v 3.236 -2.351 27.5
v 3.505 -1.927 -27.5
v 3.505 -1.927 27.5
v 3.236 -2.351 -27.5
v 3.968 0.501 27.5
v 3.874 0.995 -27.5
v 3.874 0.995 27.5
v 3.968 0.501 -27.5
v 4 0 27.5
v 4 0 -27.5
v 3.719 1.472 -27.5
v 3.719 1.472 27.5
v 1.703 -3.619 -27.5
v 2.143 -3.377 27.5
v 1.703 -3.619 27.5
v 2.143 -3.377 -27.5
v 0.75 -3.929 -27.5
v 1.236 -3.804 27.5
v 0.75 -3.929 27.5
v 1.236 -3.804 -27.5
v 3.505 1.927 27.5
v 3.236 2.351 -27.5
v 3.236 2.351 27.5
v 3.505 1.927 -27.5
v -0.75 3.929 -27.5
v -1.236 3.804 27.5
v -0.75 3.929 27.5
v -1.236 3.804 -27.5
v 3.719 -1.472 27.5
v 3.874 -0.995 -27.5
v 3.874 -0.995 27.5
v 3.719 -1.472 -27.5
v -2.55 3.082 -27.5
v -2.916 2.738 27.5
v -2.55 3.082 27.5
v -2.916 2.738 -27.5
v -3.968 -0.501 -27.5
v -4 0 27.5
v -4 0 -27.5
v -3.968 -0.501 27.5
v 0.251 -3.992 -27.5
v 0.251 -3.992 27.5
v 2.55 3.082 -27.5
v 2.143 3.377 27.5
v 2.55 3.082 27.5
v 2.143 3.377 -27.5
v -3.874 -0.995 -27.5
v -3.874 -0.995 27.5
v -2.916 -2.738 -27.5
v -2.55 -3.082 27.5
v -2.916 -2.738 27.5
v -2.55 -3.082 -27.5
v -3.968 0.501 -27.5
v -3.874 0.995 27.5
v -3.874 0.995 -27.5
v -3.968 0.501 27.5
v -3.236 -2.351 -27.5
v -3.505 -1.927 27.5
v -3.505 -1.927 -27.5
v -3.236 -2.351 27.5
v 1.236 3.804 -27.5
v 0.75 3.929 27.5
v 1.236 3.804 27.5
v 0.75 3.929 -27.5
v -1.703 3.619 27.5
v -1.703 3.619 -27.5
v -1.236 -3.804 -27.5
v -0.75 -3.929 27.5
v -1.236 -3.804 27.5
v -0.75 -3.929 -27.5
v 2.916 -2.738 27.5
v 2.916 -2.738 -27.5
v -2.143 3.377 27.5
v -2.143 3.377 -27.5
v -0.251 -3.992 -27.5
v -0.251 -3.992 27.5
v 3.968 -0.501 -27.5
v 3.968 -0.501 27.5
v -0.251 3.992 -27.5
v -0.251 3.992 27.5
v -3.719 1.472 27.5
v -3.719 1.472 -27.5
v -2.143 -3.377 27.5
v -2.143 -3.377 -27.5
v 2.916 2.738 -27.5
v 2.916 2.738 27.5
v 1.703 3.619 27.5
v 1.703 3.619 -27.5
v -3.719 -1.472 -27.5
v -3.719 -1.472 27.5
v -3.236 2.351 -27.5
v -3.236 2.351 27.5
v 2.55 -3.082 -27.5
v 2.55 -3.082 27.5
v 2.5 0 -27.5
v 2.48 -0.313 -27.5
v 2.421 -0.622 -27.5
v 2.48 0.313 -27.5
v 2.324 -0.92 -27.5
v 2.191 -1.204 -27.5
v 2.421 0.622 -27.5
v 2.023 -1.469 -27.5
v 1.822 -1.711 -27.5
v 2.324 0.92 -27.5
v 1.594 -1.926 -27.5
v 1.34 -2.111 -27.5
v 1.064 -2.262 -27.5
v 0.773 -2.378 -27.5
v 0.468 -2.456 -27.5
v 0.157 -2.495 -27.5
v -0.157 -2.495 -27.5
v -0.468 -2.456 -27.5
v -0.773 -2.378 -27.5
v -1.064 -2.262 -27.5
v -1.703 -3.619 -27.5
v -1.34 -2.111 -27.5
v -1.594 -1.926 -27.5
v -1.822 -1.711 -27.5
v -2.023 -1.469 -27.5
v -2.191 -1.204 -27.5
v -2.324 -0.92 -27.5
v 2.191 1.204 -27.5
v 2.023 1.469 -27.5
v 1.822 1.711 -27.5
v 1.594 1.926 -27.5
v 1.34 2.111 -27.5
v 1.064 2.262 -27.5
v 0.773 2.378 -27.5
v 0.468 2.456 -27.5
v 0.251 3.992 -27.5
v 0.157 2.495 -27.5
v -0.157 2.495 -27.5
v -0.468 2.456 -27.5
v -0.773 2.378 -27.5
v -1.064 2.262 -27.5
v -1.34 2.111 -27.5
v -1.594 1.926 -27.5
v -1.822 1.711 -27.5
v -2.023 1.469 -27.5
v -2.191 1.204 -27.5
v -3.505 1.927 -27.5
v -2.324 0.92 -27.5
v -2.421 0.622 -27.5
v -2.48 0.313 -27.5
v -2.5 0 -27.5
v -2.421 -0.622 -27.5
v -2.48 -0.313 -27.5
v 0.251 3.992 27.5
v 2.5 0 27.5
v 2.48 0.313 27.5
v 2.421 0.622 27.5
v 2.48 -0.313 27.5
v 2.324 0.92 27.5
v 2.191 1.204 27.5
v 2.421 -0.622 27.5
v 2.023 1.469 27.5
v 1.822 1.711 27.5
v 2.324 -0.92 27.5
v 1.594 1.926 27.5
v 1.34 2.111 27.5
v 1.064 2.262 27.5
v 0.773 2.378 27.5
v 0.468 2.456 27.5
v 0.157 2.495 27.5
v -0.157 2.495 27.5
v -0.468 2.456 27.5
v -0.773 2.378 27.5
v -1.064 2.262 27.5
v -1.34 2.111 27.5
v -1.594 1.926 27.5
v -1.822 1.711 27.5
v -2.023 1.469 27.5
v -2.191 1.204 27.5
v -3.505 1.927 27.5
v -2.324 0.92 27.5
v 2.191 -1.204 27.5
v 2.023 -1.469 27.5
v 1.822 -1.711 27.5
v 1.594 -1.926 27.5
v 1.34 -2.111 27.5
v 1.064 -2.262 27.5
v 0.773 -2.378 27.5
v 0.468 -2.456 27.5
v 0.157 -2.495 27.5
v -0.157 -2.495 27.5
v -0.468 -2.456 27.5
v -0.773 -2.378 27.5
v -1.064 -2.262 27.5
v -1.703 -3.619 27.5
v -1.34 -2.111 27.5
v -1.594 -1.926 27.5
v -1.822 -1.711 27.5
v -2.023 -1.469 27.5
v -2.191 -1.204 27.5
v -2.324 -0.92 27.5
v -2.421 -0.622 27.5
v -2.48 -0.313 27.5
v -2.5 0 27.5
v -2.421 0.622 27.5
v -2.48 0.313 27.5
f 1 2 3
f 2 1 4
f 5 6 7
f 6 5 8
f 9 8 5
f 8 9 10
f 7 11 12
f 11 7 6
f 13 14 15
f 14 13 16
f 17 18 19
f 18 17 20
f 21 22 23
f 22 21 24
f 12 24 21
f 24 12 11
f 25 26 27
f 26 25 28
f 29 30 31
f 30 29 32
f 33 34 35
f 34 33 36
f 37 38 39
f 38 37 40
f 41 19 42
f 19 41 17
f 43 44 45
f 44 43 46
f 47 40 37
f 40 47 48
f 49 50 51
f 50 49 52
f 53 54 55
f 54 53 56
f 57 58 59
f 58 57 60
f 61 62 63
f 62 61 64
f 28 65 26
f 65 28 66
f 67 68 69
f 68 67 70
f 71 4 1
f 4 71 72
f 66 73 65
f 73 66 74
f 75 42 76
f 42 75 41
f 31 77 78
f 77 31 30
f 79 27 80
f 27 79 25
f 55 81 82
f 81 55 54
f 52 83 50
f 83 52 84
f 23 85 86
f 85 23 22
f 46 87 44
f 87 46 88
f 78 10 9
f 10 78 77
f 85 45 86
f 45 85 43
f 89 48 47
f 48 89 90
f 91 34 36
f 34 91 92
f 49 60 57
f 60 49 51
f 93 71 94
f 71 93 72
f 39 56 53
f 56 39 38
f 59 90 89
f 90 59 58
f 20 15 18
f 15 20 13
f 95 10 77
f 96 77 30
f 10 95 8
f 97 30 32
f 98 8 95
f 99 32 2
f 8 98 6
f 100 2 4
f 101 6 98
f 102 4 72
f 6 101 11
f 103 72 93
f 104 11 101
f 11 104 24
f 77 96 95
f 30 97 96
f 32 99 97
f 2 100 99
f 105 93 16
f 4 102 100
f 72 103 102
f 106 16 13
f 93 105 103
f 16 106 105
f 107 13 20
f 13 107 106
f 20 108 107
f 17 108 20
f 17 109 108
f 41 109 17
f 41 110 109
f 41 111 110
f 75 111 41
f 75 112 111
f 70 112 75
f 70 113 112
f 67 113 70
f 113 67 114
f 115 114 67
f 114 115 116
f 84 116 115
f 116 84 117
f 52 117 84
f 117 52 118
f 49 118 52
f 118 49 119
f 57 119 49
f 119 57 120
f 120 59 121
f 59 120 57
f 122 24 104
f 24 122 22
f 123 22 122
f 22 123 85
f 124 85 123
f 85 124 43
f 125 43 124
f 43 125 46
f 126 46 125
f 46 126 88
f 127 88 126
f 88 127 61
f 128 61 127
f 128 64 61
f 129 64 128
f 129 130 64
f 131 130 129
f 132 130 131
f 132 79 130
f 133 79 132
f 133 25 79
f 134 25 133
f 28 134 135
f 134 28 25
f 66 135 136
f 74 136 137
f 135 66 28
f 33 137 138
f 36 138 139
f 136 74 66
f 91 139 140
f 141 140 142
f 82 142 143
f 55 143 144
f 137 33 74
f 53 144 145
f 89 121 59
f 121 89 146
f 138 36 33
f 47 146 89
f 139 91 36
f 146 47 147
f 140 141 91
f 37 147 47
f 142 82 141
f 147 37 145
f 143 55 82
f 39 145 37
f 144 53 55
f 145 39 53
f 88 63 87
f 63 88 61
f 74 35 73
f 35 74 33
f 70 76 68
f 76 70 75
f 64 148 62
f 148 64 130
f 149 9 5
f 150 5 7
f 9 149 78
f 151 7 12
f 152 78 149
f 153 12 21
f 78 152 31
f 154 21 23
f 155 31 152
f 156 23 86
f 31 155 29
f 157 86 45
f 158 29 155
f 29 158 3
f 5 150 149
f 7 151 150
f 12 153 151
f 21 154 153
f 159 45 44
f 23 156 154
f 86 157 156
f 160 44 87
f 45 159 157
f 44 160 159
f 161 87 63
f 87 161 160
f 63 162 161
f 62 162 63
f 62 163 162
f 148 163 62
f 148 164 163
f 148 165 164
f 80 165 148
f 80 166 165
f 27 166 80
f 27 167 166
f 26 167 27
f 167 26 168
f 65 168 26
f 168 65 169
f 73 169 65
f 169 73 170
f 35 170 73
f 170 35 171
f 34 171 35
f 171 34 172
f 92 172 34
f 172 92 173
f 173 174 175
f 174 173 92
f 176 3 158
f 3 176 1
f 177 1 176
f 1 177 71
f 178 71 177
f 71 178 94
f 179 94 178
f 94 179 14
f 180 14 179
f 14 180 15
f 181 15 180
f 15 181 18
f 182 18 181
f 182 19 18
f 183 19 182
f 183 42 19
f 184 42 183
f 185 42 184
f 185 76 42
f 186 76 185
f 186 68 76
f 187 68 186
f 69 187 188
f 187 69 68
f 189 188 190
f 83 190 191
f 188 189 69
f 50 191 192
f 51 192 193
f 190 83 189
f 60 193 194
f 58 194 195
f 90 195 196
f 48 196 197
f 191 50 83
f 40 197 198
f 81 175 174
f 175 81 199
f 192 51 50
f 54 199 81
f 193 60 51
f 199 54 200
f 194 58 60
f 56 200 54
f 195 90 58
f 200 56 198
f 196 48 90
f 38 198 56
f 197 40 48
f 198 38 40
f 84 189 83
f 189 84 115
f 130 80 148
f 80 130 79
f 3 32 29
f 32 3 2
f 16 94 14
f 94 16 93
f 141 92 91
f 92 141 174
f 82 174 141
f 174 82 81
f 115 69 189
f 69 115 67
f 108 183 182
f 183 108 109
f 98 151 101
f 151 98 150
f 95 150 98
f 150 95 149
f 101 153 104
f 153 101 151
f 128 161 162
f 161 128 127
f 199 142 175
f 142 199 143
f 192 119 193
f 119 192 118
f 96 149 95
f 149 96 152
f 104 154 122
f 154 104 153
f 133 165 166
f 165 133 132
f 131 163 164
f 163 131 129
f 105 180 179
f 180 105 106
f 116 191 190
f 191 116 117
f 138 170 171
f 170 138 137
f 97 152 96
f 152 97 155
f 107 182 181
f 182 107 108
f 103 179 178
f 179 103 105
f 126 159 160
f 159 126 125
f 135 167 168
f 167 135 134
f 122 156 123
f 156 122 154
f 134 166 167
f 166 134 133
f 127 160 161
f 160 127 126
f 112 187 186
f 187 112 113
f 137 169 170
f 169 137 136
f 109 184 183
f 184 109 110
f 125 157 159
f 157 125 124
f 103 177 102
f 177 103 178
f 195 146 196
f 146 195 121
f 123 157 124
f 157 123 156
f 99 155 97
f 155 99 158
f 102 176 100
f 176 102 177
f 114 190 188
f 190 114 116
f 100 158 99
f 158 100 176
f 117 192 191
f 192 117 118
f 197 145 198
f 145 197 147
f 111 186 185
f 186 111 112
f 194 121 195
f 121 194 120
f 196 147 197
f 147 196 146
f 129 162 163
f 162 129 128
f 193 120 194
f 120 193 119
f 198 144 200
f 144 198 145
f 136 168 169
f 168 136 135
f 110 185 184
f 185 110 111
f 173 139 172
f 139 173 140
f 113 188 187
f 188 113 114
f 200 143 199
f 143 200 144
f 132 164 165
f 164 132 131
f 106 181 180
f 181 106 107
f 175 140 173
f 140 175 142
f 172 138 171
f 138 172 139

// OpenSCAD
$fn = 50;


difference() {
	union() {
		translate(v = [0, 0, -27.5000000000]) {
			cylinder(h = 55, r = 4.0000000000);
		}
	}
	union() {
		translate(v = [0, 0, -100.0000000000]) {
			cylinder(h = 200, r = 2.5000000000);
		}
	}
}
